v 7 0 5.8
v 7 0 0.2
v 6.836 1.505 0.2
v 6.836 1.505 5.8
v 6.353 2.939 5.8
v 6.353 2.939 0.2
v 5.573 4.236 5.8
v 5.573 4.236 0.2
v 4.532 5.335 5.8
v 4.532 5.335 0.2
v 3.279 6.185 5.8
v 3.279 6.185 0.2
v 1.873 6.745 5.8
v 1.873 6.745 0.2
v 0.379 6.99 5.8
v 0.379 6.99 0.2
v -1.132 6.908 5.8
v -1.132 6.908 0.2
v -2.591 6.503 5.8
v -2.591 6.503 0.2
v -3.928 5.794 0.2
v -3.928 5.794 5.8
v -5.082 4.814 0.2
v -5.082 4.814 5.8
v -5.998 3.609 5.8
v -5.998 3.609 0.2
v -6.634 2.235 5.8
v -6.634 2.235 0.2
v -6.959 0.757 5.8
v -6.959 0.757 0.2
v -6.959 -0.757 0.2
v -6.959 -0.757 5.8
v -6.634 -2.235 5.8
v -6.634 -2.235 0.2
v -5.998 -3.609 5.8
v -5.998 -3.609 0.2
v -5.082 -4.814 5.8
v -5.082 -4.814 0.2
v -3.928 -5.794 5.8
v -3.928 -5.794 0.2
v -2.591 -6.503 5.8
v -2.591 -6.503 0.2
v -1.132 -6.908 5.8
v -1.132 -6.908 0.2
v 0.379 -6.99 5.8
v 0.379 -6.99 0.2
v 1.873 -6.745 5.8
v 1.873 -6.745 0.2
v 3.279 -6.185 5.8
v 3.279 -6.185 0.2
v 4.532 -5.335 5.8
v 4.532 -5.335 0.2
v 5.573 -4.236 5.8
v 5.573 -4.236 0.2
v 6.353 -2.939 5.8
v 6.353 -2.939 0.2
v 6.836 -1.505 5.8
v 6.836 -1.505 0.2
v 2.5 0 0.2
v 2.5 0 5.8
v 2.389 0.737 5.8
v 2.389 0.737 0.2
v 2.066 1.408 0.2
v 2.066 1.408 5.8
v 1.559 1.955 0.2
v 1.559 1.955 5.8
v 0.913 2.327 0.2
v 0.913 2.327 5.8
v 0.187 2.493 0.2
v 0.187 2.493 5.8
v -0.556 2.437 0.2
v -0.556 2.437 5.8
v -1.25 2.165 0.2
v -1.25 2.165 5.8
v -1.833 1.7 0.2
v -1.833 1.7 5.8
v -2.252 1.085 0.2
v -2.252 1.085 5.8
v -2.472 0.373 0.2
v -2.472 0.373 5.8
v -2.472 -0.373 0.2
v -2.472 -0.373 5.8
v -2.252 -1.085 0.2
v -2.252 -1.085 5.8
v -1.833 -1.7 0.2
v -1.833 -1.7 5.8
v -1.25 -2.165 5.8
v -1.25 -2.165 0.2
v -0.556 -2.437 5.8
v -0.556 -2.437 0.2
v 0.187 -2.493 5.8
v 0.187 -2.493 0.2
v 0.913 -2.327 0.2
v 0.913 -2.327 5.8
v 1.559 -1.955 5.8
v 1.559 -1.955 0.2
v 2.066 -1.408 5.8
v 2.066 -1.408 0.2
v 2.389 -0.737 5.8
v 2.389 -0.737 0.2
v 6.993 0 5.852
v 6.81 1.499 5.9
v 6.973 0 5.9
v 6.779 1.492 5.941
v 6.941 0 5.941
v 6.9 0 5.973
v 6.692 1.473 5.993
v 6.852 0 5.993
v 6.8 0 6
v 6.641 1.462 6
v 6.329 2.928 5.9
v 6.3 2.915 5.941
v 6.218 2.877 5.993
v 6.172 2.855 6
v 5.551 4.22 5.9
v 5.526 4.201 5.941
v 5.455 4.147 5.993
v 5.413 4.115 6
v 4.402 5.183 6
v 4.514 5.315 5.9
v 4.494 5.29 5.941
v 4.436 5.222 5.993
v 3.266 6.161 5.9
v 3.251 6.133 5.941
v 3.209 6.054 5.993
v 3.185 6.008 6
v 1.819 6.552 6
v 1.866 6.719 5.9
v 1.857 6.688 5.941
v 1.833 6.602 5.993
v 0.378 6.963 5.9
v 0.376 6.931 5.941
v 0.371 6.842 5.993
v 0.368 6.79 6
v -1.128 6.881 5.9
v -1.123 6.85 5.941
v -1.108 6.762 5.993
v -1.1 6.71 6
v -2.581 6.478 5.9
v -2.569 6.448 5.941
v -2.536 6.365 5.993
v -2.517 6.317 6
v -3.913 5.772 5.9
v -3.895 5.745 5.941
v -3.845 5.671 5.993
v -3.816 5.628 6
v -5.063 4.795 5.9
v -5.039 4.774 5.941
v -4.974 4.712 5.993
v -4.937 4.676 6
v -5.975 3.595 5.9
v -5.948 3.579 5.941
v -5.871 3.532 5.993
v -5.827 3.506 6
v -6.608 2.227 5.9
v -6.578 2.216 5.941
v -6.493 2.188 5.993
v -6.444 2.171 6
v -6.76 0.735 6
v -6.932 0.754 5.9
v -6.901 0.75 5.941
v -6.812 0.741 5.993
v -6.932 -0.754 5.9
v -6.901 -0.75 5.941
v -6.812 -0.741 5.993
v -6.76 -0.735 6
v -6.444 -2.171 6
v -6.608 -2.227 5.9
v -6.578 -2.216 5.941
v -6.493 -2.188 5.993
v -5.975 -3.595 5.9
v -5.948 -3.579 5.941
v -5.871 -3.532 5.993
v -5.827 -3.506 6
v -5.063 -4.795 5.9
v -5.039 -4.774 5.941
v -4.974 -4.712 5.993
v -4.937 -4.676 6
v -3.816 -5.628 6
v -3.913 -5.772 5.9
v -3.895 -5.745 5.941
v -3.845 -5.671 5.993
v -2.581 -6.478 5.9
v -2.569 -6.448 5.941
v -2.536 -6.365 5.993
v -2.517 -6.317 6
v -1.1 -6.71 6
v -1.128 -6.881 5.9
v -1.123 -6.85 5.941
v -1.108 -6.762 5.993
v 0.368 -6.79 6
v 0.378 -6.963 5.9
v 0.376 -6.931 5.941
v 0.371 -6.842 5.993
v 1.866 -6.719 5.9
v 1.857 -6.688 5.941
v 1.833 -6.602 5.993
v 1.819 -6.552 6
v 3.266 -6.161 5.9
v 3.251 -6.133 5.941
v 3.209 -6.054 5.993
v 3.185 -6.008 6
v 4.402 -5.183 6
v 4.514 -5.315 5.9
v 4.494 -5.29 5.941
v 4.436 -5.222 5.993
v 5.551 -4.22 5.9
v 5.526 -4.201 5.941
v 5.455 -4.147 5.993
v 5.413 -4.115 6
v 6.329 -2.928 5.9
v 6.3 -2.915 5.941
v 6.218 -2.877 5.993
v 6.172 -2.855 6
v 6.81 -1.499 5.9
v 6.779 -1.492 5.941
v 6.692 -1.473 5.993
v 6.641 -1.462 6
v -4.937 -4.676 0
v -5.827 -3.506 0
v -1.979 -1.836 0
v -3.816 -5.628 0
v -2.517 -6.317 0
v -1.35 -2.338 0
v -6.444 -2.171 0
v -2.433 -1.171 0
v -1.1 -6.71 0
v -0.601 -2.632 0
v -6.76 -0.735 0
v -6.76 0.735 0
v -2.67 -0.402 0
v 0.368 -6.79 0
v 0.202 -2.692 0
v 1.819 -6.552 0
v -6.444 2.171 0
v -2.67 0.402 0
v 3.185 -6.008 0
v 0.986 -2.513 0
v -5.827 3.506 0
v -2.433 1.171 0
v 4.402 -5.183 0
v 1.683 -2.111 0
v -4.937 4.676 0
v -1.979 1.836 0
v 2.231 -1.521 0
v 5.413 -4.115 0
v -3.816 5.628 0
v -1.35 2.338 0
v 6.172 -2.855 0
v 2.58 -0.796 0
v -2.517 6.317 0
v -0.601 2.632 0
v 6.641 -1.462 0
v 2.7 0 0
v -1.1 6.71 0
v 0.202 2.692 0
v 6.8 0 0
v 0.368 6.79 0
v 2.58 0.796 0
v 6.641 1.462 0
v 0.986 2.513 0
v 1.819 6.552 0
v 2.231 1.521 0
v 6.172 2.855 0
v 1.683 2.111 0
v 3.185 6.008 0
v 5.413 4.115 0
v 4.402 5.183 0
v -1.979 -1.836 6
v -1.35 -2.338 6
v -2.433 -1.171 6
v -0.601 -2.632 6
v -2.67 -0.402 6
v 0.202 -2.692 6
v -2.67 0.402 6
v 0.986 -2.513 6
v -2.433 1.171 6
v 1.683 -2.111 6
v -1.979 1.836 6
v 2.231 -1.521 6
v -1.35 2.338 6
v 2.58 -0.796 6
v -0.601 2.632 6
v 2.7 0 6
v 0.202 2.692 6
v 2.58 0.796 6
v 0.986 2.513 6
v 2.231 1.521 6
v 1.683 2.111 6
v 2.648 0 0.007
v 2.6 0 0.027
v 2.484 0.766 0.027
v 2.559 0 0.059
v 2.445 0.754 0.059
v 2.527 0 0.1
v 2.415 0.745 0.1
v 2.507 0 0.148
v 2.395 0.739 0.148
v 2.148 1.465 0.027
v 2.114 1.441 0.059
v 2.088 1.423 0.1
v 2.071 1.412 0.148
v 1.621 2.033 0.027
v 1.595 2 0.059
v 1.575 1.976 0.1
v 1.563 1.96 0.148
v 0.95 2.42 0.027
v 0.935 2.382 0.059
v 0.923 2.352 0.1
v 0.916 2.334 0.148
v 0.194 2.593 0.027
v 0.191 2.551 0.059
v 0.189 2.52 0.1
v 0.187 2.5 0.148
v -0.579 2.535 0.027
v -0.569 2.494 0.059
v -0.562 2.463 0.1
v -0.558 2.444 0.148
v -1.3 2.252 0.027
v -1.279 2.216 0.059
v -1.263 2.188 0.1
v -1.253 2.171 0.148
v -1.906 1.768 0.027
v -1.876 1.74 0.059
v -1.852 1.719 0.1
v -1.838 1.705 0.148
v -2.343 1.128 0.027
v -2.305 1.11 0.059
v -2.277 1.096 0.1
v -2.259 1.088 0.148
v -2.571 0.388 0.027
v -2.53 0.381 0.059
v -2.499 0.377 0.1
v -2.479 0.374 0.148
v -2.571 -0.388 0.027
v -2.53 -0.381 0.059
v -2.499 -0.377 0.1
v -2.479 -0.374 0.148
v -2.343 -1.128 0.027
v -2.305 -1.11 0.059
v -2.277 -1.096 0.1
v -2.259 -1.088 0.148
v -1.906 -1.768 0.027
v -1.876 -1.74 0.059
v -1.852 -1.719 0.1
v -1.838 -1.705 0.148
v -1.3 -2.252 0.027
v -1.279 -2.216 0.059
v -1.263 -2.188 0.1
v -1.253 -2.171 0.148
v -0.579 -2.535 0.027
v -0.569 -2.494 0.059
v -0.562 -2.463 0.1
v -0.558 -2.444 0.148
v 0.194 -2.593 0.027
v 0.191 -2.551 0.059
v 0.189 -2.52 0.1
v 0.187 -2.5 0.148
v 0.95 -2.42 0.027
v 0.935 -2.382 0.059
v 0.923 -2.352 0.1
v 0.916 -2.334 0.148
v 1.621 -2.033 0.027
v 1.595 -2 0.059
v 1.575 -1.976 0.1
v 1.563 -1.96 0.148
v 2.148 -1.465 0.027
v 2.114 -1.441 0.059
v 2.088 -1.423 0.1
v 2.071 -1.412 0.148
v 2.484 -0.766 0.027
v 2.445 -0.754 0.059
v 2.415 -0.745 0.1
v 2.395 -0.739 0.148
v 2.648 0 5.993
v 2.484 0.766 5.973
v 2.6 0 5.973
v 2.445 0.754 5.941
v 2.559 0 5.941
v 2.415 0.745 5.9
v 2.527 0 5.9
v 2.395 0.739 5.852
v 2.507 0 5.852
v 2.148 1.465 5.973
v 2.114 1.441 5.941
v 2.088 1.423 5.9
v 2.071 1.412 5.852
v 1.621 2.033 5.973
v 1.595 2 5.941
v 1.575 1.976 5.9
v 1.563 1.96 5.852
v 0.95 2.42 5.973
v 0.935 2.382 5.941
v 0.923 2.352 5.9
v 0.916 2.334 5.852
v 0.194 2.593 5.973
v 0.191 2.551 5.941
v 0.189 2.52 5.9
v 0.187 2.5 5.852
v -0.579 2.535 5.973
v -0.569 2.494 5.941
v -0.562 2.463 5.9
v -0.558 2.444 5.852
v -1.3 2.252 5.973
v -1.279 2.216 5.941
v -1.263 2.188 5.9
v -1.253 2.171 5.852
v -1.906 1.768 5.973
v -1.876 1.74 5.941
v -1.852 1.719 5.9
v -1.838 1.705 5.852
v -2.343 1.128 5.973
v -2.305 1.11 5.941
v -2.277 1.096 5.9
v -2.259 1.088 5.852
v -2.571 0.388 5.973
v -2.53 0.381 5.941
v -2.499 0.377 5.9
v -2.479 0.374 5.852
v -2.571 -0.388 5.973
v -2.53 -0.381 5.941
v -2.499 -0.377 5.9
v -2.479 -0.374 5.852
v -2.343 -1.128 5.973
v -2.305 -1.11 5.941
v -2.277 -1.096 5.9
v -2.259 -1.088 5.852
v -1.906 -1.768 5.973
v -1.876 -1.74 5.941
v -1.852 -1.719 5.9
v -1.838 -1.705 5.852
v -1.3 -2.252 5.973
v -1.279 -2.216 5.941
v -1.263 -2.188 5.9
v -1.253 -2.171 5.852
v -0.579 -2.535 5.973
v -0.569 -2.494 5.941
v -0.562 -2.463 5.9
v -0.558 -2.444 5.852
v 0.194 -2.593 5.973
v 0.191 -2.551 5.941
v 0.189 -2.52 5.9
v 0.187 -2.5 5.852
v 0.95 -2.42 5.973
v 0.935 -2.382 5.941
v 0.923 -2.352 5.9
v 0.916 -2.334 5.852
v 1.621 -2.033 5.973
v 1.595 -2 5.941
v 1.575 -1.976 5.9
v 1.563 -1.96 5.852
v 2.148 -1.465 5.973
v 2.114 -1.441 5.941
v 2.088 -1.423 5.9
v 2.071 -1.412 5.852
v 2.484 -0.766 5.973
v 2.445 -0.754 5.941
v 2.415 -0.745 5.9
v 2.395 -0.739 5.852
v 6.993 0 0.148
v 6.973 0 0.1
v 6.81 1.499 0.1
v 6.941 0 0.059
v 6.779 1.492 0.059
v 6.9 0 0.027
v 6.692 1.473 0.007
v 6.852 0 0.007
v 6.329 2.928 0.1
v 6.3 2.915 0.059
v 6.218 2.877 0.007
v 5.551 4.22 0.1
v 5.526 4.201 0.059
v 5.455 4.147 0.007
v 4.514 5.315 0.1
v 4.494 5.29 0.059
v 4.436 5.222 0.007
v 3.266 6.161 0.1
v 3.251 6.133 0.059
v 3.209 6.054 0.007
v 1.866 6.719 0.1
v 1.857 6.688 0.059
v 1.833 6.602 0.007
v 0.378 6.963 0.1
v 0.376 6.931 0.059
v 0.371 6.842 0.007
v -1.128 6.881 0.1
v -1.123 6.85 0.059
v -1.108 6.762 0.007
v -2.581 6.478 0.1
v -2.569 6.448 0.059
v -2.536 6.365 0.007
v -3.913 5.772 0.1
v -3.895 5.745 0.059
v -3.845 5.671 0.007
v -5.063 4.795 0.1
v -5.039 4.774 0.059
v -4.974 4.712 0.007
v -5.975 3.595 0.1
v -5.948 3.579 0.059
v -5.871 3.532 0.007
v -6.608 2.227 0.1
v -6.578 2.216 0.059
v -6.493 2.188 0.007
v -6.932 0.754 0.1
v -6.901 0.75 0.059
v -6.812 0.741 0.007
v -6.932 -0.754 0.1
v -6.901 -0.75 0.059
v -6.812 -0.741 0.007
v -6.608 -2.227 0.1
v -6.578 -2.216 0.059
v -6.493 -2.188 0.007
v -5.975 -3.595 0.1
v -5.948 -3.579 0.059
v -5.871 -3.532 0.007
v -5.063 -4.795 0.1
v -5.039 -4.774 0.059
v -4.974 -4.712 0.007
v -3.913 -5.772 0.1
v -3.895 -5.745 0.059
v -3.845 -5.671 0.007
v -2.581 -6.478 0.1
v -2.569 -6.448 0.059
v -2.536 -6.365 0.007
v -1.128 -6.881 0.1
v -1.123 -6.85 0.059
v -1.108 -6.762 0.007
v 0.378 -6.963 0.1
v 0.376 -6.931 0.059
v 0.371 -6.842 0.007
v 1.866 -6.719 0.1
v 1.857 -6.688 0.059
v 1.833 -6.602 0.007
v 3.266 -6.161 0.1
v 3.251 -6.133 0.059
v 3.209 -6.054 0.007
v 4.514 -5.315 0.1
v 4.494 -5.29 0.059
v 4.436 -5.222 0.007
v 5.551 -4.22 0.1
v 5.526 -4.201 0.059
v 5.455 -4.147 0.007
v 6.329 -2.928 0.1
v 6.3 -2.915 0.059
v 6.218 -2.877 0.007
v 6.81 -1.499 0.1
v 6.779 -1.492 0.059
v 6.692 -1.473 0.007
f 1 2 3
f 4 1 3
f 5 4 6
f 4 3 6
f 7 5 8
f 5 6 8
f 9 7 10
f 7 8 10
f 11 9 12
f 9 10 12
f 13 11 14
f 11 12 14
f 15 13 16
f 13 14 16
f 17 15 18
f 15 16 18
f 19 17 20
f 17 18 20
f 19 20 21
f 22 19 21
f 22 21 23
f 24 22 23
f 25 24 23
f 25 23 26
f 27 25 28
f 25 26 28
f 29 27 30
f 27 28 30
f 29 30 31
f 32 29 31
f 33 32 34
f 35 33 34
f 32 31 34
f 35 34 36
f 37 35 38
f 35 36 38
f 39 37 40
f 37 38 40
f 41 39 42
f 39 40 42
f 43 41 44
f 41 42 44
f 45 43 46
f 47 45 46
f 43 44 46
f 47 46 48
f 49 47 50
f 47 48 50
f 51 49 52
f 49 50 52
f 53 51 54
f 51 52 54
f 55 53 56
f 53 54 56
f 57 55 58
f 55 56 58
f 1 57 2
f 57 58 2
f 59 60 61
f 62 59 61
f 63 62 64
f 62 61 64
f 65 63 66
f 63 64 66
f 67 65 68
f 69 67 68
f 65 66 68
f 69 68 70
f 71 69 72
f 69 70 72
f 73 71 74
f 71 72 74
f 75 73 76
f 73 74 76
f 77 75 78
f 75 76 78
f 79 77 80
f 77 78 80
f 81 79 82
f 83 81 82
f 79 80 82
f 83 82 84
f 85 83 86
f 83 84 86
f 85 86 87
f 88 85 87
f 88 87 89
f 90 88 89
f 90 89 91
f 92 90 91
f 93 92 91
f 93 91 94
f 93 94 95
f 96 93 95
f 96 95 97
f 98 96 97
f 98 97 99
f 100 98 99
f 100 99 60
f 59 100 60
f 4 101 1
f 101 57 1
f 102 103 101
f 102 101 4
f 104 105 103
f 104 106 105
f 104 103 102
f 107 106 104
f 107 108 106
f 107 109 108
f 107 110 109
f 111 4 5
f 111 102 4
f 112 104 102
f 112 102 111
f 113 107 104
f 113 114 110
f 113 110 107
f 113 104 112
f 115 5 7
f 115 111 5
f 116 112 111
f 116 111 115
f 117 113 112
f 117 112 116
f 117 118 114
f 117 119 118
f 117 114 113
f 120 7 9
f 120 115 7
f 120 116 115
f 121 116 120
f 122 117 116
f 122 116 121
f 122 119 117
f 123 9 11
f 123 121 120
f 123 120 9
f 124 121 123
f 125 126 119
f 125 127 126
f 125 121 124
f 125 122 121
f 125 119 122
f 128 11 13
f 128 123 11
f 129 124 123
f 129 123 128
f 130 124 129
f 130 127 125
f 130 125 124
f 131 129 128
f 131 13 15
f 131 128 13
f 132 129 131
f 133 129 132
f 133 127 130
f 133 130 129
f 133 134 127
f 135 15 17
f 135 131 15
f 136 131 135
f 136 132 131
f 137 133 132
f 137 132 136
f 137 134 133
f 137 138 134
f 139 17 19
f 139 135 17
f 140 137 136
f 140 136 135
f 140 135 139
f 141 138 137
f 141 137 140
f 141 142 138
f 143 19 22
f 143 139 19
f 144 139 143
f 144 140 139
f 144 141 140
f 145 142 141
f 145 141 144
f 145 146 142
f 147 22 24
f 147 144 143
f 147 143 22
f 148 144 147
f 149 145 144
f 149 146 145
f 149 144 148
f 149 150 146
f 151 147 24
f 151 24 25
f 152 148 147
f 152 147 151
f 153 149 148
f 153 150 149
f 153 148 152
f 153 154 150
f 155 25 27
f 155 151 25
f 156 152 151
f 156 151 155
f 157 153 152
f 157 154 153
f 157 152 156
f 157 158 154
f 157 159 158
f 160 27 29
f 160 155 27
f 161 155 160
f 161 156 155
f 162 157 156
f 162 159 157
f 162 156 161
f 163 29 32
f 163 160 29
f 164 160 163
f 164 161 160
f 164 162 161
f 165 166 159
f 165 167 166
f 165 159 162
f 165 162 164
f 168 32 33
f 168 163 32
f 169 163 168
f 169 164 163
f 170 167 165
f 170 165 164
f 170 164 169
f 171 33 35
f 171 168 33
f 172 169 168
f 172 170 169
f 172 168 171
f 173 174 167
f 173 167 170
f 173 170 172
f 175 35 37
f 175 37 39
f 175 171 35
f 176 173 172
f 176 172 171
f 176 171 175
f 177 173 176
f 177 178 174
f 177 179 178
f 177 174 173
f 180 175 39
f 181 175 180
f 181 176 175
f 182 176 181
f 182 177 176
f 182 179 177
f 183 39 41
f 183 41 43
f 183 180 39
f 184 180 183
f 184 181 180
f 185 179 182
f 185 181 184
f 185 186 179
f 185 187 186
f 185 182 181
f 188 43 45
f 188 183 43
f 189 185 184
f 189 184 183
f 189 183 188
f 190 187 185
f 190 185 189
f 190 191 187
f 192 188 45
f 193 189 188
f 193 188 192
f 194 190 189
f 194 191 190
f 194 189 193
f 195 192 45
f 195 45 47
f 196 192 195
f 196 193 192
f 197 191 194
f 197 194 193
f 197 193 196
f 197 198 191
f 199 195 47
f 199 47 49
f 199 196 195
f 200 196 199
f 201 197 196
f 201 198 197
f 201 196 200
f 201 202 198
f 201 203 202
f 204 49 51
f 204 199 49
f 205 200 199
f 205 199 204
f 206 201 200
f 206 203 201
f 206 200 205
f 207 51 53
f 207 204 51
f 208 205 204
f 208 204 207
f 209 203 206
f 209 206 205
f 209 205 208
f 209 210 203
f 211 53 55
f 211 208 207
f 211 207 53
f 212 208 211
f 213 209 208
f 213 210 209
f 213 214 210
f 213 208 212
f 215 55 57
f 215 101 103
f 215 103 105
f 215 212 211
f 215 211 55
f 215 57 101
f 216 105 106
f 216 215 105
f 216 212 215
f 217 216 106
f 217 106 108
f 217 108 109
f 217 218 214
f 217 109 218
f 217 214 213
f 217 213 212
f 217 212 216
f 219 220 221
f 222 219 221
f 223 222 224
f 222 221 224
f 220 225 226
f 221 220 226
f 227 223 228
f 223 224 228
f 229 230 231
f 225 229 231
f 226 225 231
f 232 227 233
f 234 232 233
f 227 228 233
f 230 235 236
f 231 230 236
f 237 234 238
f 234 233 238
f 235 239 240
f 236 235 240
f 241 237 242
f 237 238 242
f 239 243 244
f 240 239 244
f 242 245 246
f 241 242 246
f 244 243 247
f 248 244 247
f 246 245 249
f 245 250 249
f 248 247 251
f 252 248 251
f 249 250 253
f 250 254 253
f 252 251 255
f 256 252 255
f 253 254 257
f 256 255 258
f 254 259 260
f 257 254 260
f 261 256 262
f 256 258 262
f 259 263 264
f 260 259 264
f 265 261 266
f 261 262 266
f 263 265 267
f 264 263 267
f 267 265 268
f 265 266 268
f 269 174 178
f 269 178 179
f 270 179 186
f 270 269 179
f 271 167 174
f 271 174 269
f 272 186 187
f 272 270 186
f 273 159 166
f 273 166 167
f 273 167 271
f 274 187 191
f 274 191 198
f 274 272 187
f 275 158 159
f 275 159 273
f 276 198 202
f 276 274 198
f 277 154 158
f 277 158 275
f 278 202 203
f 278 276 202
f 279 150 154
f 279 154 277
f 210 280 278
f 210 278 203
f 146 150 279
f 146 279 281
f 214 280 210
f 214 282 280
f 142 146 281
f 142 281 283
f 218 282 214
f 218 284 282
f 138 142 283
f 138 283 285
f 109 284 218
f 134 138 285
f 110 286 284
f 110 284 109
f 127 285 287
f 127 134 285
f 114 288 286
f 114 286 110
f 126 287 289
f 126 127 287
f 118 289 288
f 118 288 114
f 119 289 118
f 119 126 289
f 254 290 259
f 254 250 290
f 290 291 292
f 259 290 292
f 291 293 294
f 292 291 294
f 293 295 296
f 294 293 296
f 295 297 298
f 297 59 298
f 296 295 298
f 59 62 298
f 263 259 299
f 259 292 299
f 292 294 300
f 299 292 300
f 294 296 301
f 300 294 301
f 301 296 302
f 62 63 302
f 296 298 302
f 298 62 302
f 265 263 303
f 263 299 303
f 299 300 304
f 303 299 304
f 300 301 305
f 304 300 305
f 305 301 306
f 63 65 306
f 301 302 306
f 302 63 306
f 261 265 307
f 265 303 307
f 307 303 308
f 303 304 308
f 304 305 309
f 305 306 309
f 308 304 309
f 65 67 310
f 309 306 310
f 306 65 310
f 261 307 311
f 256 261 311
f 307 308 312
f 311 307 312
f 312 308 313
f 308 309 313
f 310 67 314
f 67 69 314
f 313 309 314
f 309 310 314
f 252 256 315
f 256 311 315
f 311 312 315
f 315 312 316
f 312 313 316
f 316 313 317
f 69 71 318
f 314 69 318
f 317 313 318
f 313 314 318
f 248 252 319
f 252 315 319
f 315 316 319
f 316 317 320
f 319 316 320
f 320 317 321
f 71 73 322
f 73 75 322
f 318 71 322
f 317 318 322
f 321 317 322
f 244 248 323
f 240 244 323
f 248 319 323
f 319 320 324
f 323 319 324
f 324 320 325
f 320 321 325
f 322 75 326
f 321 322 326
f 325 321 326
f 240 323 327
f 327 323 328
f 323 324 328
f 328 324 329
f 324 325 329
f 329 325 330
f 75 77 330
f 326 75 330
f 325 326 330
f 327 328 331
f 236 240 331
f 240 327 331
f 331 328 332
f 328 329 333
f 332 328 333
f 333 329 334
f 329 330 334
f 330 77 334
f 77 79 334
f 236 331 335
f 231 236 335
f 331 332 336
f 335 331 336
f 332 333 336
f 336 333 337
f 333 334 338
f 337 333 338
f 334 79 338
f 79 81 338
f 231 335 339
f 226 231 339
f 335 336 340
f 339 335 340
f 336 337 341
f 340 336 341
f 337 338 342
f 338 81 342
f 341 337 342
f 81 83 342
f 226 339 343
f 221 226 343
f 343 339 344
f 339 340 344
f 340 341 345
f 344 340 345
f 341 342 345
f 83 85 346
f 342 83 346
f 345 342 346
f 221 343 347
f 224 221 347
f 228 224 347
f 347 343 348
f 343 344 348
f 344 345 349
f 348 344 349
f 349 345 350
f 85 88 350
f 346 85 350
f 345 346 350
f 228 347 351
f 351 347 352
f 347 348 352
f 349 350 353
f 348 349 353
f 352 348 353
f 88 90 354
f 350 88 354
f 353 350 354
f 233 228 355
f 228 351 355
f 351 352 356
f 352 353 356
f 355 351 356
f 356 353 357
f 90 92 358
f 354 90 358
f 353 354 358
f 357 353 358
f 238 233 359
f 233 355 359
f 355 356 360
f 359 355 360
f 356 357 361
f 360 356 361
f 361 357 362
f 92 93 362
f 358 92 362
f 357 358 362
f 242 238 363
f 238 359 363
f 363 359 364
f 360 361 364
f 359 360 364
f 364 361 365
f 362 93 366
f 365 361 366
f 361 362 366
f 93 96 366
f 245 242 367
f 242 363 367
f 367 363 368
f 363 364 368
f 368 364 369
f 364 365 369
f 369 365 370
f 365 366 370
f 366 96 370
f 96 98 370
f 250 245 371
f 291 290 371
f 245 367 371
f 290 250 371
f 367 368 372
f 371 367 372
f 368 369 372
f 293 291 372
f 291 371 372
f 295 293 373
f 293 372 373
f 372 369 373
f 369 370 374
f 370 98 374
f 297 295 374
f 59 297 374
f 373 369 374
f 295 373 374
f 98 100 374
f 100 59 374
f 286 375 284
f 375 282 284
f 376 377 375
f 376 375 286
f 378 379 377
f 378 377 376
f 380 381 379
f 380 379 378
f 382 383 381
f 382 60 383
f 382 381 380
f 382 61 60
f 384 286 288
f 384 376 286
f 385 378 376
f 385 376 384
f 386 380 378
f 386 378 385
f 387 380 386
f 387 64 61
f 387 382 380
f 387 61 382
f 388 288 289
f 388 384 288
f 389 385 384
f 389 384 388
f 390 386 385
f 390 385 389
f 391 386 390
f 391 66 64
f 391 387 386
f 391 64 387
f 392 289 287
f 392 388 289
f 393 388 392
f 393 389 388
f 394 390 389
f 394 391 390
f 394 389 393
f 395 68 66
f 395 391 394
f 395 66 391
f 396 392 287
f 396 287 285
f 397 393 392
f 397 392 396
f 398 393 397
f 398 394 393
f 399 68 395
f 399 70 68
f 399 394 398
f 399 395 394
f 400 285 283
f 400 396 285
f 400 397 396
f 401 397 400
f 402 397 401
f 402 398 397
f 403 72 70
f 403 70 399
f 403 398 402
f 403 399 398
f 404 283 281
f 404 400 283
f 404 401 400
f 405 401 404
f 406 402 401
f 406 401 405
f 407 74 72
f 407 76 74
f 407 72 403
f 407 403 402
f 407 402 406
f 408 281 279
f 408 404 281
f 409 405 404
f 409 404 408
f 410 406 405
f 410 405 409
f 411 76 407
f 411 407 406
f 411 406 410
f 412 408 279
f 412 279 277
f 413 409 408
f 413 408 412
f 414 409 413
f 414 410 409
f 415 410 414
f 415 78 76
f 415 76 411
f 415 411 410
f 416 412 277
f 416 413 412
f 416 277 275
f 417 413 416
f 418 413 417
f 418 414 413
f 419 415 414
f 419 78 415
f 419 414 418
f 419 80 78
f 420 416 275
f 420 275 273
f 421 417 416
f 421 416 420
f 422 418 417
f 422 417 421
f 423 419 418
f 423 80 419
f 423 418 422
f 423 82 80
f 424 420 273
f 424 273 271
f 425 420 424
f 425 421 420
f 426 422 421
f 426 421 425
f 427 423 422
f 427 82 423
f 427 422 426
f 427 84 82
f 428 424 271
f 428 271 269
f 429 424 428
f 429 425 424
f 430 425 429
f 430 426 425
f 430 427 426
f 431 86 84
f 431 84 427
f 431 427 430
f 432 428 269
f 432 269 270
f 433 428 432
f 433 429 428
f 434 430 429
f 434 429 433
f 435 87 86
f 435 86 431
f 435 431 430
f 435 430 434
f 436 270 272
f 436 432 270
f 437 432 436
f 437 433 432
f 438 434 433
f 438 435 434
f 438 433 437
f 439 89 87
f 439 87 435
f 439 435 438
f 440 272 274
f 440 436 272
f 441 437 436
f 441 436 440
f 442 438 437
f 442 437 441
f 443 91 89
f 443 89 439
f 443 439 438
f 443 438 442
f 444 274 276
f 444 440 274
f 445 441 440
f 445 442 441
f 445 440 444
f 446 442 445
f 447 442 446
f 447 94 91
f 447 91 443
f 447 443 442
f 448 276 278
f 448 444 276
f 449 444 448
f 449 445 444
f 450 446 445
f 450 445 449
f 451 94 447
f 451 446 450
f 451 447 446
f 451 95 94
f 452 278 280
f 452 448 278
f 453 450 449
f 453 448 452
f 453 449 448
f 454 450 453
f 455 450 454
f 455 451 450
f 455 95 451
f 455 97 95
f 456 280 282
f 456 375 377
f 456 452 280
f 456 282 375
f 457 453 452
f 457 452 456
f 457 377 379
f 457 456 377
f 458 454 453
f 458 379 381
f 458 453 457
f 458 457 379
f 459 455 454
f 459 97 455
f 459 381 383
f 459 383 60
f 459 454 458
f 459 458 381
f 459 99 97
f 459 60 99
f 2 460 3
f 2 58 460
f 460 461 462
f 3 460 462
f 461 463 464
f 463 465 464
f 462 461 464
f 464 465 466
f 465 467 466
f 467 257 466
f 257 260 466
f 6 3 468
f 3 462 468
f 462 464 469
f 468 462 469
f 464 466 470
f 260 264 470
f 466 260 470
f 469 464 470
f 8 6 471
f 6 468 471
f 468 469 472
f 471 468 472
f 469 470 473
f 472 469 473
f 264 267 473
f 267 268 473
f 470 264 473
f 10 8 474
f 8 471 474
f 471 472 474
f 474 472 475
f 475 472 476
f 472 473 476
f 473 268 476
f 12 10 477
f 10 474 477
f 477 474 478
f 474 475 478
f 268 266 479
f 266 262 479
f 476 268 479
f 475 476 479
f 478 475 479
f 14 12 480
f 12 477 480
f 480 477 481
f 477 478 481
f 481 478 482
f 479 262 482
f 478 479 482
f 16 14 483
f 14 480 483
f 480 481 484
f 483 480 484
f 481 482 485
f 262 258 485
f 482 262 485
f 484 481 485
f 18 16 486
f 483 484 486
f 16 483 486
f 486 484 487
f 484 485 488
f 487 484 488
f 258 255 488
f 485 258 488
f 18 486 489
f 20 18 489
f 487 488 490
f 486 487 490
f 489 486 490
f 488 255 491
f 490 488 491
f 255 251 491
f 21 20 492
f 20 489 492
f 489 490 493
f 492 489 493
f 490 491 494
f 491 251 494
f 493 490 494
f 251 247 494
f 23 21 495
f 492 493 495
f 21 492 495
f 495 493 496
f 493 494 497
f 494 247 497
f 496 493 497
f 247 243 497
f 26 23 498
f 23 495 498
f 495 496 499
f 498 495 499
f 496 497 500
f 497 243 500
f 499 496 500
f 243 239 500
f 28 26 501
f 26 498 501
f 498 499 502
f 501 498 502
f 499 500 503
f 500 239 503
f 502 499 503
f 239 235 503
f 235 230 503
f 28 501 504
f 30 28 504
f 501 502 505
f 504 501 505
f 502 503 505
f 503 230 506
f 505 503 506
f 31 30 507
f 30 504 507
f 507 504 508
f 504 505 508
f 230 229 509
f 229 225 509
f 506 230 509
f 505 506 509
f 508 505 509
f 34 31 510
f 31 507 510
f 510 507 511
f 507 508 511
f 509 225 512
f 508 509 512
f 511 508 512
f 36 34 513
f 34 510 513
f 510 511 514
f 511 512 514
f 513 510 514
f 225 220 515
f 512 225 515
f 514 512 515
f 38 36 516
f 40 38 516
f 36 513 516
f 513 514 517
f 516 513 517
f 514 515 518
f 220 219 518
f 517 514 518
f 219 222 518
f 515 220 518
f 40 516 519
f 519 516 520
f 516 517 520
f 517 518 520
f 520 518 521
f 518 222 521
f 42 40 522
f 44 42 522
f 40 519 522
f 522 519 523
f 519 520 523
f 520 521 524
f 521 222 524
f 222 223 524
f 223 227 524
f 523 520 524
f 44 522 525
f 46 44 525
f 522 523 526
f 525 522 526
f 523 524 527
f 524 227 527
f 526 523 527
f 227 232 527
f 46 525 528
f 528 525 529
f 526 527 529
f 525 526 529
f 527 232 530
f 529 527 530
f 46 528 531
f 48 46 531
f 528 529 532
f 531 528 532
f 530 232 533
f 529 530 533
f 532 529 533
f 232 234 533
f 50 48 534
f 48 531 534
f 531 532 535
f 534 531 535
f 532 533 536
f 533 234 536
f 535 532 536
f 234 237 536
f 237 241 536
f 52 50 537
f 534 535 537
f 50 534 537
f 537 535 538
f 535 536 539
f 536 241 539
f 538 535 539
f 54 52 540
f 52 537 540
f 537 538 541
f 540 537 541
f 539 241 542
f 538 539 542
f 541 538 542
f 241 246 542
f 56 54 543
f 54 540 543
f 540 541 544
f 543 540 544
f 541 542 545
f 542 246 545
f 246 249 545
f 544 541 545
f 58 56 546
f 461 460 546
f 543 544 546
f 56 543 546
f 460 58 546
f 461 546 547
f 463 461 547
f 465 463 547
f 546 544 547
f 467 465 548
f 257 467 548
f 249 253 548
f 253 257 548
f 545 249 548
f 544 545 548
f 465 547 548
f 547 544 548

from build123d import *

# Parameters (mm, degrees)
SKETCH_1_R          = 7
EXTRUDE_1_DEPTH     = 6
SKETCH_2_R          = 2.5
CUT_EXTRUDE_1_DEPTH = 12.575836903
FILLET_1_R          = 0.2


with BuildPart() as part:
    # 草图1 → 凸台-拉伸1 (new body)
    with BuildSketch(Plane.XY):
        Circle(SKETCH_1_R)
    extrude(amount=EXTRUDE_1_DEPTH)

    # 草图2 → 切除-拉伸1 (cut, through all)
    with BuildSketch(Plane.XY.offset(6)):
        Circle(SKETCH_2_R)
    extrude(amount=-CUT_EXTRUDE_1_DEPTH, mode=Mode.SUBTRACT)

    # 圆角1
    fillet_1_edges = [part.edges().sort_by_distance(p)[0] for p in [
        (-7, 0, 0),
        (-7, 0, 6),
        (-2.5, 0, 0),
        (-2.5, 0, 6),
    ]]
    fillet(fillet_1_edges, radius=FILLET_1_R)


solid = part.part
